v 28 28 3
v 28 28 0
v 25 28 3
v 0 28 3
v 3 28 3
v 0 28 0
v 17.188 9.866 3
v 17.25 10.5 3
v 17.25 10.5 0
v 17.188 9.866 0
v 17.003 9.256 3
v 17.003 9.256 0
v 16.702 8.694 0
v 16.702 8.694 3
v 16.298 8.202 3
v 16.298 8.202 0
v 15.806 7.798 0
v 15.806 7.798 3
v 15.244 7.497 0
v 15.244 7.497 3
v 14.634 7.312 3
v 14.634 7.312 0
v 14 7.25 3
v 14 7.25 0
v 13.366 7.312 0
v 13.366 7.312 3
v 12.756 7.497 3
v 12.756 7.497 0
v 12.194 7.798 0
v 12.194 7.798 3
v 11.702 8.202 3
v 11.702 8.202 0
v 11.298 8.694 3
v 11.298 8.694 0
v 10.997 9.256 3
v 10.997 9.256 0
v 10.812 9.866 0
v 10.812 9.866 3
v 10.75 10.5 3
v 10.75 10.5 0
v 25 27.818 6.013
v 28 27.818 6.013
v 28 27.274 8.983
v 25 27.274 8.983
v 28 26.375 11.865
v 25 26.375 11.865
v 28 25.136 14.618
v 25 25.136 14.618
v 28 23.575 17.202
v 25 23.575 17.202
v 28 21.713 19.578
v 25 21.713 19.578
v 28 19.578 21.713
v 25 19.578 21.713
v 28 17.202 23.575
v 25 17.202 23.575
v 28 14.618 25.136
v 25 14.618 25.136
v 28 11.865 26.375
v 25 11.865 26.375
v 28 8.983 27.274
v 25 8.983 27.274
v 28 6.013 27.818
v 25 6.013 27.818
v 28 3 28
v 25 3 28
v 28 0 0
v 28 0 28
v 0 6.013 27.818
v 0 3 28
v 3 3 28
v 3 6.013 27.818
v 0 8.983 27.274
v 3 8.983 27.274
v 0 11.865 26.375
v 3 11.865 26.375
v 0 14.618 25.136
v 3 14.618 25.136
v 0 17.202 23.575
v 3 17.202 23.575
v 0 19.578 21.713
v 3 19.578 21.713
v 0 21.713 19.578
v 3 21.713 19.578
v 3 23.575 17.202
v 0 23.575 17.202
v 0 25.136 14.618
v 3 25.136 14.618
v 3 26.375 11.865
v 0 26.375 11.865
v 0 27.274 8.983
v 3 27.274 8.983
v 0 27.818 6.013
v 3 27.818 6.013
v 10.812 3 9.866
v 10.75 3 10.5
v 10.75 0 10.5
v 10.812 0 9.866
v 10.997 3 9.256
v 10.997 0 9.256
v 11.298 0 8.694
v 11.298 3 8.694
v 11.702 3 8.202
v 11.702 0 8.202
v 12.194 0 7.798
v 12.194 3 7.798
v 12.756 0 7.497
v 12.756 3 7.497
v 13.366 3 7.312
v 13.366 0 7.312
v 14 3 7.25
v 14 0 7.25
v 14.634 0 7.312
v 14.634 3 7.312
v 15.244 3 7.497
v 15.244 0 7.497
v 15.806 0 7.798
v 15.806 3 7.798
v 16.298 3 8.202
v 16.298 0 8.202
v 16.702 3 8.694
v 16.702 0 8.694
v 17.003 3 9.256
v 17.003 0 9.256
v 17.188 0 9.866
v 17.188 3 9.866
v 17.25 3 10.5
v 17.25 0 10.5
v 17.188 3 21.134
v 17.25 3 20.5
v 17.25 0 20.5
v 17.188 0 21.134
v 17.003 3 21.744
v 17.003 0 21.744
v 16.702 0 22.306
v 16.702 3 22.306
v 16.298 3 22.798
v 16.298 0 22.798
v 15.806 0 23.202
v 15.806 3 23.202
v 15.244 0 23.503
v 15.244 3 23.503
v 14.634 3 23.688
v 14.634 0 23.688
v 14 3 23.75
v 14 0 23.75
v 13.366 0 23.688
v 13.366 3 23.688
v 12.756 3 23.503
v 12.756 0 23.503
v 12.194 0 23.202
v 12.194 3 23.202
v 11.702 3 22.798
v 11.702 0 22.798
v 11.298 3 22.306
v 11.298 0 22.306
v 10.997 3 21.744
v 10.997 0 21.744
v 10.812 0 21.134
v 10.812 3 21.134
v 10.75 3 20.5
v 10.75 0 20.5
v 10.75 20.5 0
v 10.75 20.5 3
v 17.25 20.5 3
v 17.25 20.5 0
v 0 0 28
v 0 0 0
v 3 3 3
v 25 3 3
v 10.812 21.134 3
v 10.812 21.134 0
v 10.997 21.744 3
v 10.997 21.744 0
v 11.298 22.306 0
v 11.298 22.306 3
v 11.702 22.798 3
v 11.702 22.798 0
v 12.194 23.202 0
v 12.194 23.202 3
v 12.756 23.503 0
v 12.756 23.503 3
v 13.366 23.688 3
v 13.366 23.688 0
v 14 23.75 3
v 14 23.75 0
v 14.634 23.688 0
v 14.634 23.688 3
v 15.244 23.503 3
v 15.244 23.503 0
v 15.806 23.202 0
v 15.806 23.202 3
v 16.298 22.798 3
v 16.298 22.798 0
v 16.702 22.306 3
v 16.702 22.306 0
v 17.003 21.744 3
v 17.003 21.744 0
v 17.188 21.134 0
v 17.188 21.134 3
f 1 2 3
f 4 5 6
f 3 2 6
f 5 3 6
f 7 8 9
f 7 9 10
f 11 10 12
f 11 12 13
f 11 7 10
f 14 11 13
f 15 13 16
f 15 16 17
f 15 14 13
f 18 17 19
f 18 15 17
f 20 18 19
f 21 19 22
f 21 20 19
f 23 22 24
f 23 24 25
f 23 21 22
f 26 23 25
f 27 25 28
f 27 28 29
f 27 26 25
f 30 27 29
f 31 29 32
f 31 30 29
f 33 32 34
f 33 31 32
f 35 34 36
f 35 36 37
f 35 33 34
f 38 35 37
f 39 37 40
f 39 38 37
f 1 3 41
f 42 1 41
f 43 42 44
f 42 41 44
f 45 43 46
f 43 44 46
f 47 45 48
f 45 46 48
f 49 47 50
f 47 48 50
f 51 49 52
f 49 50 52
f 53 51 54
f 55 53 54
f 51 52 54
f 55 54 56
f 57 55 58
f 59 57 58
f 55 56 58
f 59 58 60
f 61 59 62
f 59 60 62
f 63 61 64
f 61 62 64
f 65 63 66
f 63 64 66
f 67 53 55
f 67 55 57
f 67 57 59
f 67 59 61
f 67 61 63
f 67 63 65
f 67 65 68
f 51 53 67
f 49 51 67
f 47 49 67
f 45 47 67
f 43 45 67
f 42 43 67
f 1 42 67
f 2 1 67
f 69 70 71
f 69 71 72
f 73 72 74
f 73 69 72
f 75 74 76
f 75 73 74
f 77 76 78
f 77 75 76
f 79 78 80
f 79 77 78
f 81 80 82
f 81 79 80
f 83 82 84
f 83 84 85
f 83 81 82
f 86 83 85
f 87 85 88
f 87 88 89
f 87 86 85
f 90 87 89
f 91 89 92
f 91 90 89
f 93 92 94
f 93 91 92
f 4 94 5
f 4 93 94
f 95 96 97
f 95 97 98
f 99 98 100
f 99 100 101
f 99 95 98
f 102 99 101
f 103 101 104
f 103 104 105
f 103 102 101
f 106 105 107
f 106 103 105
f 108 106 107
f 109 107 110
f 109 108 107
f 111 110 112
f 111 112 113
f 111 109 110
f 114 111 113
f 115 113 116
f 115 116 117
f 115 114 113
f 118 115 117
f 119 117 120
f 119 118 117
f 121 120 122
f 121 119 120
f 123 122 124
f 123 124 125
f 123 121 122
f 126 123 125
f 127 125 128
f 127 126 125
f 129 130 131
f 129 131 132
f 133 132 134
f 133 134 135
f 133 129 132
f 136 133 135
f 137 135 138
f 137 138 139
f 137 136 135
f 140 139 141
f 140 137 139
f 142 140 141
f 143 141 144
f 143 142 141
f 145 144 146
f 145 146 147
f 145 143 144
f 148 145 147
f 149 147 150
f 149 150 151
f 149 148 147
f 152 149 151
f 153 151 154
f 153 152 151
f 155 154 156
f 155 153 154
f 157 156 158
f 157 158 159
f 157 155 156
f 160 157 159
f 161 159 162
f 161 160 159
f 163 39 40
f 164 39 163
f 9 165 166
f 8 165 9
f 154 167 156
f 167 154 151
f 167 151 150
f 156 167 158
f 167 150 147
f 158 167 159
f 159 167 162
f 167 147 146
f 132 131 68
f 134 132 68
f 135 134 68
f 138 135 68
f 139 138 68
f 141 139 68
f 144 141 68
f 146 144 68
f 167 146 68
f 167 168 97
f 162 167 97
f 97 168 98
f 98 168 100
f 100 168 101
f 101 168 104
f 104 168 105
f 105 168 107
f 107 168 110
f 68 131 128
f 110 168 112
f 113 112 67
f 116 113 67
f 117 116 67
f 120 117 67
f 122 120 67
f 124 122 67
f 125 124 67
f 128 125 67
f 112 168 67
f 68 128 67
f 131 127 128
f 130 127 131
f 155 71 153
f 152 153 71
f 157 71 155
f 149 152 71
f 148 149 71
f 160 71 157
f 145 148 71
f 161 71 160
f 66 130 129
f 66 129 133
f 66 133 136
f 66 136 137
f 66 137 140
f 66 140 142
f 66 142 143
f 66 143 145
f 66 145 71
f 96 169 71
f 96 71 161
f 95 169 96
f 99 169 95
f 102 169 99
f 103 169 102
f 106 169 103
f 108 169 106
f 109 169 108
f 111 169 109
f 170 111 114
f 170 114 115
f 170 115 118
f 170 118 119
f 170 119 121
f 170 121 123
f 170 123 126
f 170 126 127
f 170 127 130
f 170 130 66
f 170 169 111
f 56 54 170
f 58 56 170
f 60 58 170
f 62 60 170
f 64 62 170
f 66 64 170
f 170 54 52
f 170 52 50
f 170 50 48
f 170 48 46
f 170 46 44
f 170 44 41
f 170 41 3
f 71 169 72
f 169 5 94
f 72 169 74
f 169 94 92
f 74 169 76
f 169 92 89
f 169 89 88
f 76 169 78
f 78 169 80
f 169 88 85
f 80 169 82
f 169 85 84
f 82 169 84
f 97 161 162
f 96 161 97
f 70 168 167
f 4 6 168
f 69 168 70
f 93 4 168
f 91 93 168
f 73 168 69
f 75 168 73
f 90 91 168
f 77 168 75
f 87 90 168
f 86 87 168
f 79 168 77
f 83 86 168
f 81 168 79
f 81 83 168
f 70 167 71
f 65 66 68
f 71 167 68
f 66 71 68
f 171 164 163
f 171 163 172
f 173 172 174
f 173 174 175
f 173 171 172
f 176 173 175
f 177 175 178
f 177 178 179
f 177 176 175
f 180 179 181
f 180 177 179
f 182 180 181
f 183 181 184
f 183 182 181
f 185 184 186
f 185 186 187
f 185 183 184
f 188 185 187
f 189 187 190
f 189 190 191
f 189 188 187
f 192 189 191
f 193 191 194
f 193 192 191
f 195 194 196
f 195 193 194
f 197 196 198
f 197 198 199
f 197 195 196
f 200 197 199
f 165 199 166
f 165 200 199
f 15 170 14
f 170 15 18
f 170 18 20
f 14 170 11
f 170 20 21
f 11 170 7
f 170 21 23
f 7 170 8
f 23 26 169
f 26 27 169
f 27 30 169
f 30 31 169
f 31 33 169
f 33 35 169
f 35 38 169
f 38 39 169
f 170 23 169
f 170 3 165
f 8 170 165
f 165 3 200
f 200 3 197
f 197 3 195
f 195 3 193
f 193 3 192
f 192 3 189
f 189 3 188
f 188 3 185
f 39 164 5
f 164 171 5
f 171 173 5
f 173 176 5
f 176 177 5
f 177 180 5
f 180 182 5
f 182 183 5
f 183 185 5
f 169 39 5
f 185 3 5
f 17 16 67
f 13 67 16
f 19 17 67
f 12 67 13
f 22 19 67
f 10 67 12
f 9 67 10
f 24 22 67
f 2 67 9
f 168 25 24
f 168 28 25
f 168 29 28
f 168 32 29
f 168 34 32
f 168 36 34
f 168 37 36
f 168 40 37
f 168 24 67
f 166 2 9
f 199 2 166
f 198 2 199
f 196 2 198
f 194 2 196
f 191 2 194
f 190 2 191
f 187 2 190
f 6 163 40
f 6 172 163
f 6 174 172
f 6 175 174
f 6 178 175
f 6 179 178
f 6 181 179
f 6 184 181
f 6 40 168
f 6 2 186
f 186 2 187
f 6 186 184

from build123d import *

# Parameters (mm, degrees)
SKETCH1_W           = 28
SKETCH1_H           = 28
BOSS_EXTRUDE1_DEPTH = 3
SKETCH2_W           = 28
SKETCH2_H           = 25
BOSS_EXTRUDE2_DEPTH = 3
BOSS_EXTRUDE3_DEPTH = 3
BOSS_EXTRUDE4_START = -3
BOSS_EXTRUDE4_DEPTH = 3
CUT_EXTRUDE1_DEPTH  = 3
CUT_EXTRUDE2_DEPTH  = 3


with BuildPart() as part:
    # Sketch1 → Boss-Extrude1 (new body)
    with BuildSketch(Plane(origin=(0, 0, 0), x_dir=(1, 0, 0), z_dir=(0, 1, 0))):
        with Locations((14, -14)):
            Rectangle(SKETCH1_W, SKETCH1_H)
    extrude(amount=BOSS_EXTRUDE1_DEPTH)

    # Sketch2 → Boss-Extrude2 (add)
    with BuildSketch(Plane(origin=(0, 0, 0), x_dir=(-1, 0, 0), z_dir=(0, 0, -1))):
        with Locations((-14, 15.5)):
            Rectangle(SKETCH2_W, SKETCH2_H)
    extrude(amount=-BOSS_EXTRUDE2_DEPTH)

    # Sketch3 → Boss-Extrude3 (add)
    with BuildSketch(Plane.ZY):
        with BuildLine():
            Line((3, 28), (3, 3))
            Line((3, 3), (28, 3))
            ThreePointArc((28, 3), (20.67766953, 20.67766953), (3, 28))
        make_face()
    extrude(amount=-BOSS_EXTRUDE3_DEPTH)

    # Sketch4 → Boss-Extrude4 (add)
    with BuildSketch(Plane(origin=(28, 0, 0), x_dir=(0, 0, -1), z_dir=(1, 0, 0)).offset(BOSS_EXTRUDE4_START)):
        with BuildLine():
            Line((-28, 3), (-3, 3))
            Line((-3, 3), (-3, 28))
            ThreePointArc((-3, 28), (-20.67766953, 20.67766953), (-28, 3))
        make_face()
    extrude(amount=BOSS_EXTRUDE4_DEPTH)

    # Sketch5 → Cut-Extrude1 (cut)
    with BuildSketch(Plane.XY.offset(3)):
        with BuildLine():
            Line((10.75, 10.5), (10.75, 20.5))
            ThreePointArc((10.75, 20.5), (14, 23.75), (17.25, 20.5))
            Line((17.25, 20.5), (17.25, 10.5))
            ThreePointArc((17.25, 10.5), (14, 7.25), (10.75, 10.5))
        make_face()
    extrude(amount=-CUT_EXTRUDE1_DEPTH, mode=Mode.SUBTRACT)

    # Sketch6 → Cut-Extrude2 (cut)
    with BuildSketch(Plane(origin=(0, 3, 0), x_dir=(1, 0, 0), z_dir=(0, 1, 0))):
        with BuildLine():
            Line((17.25, -10.5), (17.25, -20.5))
            ThreePointArc((17.25, -20.5), (14, -23.75), (10.75, -20.5))
            Line((10.75, -20.5), (10.75, -10.5))
            ThreePointArc((10.75, -10.5), (14, -7.25), (17.25, -10.5))
        make_face()
    extrude(amount=-CUT_EXTRUDE2_DEPTH, mode=Mode.SUBTRACT)


solid = part.part
